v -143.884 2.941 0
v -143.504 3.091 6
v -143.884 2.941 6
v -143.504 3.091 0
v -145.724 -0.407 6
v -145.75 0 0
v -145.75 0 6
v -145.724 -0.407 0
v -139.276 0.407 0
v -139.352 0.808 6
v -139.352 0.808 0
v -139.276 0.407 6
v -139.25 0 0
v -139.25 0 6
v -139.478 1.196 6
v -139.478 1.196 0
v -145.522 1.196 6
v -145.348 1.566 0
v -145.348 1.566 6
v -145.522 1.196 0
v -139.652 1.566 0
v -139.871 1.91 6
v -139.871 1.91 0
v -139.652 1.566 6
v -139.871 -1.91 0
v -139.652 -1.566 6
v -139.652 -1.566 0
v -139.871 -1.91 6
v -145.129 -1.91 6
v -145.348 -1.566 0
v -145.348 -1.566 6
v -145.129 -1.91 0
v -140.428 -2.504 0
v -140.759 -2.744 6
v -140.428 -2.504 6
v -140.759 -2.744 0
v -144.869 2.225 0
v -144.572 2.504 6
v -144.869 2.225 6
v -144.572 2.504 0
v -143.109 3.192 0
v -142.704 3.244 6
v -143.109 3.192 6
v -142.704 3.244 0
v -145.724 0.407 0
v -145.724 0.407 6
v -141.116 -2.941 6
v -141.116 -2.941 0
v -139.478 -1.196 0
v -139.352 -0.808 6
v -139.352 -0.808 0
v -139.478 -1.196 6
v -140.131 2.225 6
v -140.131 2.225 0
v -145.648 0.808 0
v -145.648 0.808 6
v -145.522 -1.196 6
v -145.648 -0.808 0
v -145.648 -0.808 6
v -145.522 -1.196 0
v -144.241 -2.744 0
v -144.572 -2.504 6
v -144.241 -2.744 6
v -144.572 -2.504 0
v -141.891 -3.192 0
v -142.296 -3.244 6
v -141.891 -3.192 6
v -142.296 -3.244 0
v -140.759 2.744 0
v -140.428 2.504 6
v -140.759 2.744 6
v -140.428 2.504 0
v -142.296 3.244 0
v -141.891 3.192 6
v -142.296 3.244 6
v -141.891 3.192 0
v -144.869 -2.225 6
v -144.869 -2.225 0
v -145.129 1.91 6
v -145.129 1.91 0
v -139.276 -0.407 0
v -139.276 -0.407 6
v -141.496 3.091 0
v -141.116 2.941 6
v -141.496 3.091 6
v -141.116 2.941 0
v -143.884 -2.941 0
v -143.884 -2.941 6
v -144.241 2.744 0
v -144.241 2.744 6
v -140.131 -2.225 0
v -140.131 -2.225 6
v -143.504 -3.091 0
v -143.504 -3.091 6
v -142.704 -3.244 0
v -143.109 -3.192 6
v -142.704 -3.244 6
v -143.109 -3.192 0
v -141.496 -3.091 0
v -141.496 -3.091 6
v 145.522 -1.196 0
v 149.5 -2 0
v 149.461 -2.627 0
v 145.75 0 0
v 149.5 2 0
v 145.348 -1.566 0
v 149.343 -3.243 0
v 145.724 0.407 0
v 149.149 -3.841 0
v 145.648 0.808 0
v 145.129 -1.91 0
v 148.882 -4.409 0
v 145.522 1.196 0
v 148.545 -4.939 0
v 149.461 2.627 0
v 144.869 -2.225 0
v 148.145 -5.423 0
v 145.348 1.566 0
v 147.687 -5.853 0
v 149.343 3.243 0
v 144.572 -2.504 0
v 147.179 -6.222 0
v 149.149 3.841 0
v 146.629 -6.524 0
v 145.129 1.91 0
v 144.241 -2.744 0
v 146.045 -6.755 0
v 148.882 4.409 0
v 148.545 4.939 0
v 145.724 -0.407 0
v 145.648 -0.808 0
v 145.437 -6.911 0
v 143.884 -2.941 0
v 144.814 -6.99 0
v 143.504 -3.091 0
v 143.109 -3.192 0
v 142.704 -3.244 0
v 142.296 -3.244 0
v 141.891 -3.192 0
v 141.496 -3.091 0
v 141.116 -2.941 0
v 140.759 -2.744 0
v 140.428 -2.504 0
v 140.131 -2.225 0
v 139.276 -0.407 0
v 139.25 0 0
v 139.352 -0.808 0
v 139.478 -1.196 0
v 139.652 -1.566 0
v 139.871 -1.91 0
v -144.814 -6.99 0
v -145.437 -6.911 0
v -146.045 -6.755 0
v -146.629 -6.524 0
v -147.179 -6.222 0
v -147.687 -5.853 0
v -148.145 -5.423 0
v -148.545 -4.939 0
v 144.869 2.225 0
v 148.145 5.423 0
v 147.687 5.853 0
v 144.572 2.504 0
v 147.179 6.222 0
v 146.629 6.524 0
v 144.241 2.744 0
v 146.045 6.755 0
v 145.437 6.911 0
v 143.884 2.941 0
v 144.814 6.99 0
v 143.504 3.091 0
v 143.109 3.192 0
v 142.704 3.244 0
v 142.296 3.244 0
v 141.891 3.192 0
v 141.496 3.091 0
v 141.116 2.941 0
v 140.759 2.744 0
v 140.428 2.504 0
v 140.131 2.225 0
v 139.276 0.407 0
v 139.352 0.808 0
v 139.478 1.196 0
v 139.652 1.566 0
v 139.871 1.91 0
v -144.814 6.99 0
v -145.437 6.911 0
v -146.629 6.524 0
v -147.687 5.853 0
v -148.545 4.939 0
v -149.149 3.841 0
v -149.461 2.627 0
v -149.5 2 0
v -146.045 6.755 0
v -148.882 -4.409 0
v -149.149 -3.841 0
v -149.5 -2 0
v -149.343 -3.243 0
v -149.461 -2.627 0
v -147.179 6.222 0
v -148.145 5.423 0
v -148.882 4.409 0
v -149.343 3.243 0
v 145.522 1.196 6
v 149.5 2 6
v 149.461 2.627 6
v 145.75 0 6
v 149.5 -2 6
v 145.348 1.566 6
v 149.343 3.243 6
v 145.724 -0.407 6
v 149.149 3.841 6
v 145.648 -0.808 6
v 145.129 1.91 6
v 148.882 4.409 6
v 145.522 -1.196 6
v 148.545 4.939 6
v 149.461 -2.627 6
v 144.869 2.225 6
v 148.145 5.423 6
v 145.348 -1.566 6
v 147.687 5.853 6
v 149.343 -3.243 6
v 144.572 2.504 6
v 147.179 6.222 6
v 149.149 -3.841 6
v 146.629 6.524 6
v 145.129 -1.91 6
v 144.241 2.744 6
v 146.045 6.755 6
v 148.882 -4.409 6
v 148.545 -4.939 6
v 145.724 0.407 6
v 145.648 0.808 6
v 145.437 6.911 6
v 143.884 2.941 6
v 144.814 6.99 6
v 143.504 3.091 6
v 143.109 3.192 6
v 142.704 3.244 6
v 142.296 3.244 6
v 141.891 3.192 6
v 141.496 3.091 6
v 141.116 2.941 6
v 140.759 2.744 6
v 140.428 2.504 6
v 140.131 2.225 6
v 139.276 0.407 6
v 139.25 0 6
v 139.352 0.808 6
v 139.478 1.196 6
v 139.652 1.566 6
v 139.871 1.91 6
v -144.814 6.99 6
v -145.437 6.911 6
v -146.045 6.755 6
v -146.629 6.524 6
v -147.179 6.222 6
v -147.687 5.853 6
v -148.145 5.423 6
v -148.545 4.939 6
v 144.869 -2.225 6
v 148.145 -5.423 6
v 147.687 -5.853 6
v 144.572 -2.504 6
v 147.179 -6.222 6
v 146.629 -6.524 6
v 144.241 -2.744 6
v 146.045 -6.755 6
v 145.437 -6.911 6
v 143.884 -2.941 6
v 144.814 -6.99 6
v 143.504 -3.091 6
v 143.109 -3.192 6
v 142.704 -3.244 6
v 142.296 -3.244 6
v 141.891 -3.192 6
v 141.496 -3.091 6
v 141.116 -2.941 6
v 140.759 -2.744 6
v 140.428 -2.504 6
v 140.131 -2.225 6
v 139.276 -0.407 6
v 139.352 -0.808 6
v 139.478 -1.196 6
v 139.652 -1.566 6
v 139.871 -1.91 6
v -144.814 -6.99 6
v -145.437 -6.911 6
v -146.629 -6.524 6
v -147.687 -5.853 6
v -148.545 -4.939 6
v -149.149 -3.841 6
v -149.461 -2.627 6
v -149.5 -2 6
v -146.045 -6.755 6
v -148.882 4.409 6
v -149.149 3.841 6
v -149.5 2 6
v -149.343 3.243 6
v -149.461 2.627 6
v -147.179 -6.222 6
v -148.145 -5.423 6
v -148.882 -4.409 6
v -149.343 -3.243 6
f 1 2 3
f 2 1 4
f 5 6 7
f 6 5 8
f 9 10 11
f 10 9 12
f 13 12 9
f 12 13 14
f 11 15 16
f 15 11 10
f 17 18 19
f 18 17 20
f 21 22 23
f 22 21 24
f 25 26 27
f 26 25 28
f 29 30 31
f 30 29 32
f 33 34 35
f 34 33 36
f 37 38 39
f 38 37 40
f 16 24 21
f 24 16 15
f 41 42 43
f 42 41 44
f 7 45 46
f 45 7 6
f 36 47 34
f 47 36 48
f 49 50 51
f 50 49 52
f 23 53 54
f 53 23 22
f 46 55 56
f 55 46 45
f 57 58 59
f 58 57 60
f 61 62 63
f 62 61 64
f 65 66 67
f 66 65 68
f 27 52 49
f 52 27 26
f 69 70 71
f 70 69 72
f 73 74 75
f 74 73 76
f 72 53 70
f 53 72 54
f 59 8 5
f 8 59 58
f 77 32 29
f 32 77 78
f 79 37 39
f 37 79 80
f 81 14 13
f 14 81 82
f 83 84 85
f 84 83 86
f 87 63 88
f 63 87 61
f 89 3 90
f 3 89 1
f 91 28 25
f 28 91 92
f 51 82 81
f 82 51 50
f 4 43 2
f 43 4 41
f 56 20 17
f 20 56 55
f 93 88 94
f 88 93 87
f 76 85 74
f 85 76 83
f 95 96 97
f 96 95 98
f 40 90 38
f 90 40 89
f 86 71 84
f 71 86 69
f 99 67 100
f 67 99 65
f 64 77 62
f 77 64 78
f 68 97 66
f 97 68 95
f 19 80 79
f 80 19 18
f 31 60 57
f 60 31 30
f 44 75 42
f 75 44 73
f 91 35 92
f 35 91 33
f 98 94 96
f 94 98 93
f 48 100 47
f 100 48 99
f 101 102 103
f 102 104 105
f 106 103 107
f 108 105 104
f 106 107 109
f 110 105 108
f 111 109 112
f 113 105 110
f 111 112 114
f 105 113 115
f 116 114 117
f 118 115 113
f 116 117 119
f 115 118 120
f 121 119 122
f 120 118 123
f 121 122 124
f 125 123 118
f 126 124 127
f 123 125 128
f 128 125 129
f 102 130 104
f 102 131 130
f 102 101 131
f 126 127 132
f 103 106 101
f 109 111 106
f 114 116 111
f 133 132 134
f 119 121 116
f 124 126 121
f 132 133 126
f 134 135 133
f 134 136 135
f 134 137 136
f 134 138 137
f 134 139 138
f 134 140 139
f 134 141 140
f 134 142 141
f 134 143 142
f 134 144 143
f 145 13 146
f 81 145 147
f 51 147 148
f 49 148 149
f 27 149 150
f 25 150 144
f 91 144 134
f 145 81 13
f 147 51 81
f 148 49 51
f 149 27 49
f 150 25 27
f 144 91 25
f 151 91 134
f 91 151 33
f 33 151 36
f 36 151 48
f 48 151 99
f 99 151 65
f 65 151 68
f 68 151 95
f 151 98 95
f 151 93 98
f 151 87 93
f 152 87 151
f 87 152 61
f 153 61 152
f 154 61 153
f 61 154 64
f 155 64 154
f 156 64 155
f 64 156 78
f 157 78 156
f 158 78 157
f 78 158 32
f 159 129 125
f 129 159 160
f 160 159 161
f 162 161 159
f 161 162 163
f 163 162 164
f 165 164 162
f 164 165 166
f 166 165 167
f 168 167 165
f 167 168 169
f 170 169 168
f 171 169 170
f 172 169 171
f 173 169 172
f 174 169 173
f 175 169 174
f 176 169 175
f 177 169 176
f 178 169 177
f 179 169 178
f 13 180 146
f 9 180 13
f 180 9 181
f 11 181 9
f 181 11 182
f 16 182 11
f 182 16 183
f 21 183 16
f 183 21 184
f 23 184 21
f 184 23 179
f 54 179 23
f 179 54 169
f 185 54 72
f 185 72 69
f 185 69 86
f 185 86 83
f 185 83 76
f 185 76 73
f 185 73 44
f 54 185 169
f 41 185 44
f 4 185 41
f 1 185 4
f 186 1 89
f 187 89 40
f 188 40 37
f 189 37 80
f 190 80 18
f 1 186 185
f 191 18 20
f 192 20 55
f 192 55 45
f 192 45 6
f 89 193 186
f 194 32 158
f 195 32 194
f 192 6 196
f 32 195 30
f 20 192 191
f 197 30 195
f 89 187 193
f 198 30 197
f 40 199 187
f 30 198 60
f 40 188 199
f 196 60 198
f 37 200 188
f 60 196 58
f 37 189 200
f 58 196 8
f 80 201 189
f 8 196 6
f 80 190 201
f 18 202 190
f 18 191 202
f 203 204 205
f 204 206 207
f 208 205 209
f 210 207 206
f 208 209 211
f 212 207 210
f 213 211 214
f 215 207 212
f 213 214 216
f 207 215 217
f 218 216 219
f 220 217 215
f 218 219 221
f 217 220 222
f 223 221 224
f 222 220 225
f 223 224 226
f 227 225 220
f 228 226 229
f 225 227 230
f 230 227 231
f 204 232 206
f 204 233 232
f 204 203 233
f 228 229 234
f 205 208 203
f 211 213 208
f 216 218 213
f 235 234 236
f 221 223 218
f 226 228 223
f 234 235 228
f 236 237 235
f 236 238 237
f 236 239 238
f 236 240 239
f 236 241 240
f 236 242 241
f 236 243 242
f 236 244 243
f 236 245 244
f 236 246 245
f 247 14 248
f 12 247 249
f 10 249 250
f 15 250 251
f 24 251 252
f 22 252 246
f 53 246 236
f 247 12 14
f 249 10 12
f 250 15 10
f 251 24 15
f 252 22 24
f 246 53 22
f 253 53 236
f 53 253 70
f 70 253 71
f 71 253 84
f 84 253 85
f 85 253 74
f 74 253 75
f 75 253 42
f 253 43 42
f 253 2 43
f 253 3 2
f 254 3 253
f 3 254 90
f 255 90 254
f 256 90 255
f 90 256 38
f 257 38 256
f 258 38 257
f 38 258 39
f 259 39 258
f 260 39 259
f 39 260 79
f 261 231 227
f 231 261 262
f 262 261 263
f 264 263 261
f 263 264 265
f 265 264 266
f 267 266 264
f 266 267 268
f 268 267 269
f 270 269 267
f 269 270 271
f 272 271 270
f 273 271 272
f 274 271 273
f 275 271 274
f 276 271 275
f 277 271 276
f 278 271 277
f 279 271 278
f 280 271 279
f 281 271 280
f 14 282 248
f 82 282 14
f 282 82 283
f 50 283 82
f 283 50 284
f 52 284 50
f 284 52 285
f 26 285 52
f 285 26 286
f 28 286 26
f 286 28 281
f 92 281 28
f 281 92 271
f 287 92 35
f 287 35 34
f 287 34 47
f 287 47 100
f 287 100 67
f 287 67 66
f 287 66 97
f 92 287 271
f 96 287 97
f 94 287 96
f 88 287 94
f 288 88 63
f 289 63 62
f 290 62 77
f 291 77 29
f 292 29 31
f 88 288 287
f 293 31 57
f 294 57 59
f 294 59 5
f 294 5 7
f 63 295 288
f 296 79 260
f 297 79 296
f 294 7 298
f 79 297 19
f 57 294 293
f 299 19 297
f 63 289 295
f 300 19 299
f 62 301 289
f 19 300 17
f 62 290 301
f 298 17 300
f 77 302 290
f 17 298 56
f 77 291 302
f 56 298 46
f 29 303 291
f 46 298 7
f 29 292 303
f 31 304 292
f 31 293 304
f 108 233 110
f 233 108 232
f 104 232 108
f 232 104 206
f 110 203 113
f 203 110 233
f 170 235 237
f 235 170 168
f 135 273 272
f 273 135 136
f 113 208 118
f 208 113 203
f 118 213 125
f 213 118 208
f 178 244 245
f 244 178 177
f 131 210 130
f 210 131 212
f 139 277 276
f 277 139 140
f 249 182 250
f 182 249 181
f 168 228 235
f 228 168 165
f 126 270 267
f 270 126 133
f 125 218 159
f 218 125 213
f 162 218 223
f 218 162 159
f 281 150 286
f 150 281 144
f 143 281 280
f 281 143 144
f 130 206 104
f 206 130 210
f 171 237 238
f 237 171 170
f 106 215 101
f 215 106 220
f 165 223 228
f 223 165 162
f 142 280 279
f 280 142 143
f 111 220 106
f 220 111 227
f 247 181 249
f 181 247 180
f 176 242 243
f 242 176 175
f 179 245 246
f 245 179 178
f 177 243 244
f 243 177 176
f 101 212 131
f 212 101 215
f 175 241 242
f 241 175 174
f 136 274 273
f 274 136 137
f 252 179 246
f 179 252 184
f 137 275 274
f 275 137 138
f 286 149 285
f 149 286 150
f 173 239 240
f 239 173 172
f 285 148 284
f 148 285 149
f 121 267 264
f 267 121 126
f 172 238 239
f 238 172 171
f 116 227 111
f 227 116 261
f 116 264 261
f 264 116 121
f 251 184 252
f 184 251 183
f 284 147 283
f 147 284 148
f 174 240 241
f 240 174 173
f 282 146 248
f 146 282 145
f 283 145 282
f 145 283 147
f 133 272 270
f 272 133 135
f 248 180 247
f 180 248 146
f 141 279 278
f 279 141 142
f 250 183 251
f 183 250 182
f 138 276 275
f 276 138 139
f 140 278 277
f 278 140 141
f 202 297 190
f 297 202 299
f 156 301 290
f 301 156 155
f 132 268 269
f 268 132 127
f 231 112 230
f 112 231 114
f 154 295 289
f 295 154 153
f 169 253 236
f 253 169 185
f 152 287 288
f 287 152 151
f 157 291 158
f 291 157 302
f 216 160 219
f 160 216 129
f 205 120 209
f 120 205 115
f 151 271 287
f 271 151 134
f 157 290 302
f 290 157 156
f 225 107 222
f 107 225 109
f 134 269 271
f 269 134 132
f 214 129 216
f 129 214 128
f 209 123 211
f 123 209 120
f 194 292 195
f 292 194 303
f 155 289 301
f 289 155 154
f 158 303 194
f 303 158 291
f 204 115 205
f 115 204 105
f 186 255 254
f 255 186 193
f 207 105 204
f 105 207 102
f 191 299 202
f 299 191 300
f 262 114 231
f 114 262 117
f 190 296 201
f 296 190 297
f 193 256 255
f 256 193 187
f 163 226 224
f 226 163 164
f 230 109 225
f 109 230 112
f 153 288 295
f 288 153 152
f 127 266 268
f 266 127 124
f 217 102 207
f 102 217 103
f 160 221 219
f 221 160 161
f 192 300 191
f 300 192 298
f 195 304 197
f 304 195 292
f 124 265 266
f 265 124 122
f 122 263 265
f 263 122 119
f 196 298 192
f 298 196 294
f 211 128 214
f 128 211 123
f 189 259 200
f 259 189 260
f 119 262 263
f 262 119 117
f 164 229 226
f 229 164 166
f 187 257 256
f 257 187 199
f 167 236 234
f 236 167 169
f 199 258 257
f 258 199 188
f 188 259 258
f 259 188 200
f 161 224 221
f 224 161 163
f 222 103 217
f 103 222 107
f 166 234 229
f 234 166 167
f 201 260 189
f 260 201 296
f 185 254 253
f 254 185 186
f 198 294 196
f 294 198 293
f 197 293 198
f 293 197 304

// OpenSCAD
$fn = 50;


difference() {
	union() {
		hull() {
			translate(v = [-144.5000000000, 2.0000000000, 0]) {
				cylinder(h = 6, r = 5);
			}
			translate(v = [144.5000000000, 2.0000000000, 0]) {
				cylinder(h = 6, r = 5);
			}
			translate(v = [-144.5000000000, -2.0000000000, 0]) {
				cylinder(h = 6, r = 5);
			}
			translate(v = [144.5000000000, -2.0000000000, 0]) {
				cylinder(h = 6, r = 5);
			}
		}
	}
	union() {
		translate(v = [-142.5000000000, 0.0000000000, 0]) {
			cylinder(h = 6, r = 3.2500000000);
		}
		translate(v = [142.5000000000, 0.0000000000, 0]) {
			cylinder(h = 6, r = 3.2500000000);
		}
		translate(v = [-142.5000000000, 0.0000000000, 0]) {
			cylinder(h = 6, r = 1.8000000000);
		}
		translate(v = [142.5000000000, 0.0000000000, 0]) {
			cylinder(h = 6, r = 1.8000000000);
		}
		translate(v = [-142.5000000000, 0.0000000000, 0]) {
			cylinder(h = 6, r = 1.8000000000);
		}
		translate(v = [142.5000000000, 0.0000000000, 0]) {
			cylinder(h = 6, r = 1.8000000000);
		}
		translate(v = [-142.5000000000, 0.0000000000, 0]) {
			cylinder(h = 6, r = 1.8000000000);
		}
		translate(v = [142.5000000000, 0.0000000000, 0]) {
			cylinder(h = 6, r = 1.8000000000);
		}
	}
}
